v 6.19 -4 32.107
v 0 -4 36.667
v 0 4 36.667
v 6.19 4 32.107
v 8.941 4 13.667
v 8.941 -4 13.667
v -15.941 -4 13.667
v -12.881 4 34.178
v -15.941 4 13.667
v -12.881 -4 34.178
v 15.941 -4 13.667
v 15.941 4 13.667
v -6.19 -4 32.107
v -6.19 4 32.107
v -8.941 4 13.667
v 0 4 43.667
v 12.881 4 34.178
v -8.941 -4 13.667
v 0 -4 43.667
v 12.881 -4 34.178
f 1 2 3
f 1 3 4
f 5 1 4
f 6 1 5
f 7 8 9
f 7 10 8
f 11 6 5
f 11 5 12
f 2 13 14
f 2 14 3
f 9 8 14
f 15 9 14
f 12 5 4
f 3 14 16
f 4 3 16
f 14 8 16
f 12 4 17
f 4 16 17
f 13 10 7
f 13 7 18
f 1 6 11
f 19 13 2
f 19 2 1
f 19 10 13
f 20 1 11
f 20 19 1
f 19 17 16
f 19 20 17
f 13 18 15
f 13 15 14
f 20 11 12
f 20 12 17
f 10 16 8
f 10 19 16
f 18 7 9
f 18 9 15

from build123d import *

# Parameters (mm, degrees)
F2_DEPTH = 4


# Not quite as in the source:
# - the program builds the solid bodies; features that only make, move or delete a surface that nothing else refers to are left out


with BuildPart() as f2:
    # F0 (on Front) → F2 (new body, symmetric)
    with BuildSketch(Plane.XZ):
        Polygon((-12.8808012232, 34.1780185699), (-15.9405209124, 13.6672500521), (-8.9405209124, 13.6672500521), (-6.189699587, 32.1073246897), (0, 36.6672500521), (6.189699587, 32.1073246897), (8.9405209124, 13.6672500521), (15.9405209124, 13.6672500521), (12.8808012232, 34.1780185699), (0, 43.6672500521), align=None)
    extrude(amount=F2_DEPTH, both=True)


solid = f2.part
